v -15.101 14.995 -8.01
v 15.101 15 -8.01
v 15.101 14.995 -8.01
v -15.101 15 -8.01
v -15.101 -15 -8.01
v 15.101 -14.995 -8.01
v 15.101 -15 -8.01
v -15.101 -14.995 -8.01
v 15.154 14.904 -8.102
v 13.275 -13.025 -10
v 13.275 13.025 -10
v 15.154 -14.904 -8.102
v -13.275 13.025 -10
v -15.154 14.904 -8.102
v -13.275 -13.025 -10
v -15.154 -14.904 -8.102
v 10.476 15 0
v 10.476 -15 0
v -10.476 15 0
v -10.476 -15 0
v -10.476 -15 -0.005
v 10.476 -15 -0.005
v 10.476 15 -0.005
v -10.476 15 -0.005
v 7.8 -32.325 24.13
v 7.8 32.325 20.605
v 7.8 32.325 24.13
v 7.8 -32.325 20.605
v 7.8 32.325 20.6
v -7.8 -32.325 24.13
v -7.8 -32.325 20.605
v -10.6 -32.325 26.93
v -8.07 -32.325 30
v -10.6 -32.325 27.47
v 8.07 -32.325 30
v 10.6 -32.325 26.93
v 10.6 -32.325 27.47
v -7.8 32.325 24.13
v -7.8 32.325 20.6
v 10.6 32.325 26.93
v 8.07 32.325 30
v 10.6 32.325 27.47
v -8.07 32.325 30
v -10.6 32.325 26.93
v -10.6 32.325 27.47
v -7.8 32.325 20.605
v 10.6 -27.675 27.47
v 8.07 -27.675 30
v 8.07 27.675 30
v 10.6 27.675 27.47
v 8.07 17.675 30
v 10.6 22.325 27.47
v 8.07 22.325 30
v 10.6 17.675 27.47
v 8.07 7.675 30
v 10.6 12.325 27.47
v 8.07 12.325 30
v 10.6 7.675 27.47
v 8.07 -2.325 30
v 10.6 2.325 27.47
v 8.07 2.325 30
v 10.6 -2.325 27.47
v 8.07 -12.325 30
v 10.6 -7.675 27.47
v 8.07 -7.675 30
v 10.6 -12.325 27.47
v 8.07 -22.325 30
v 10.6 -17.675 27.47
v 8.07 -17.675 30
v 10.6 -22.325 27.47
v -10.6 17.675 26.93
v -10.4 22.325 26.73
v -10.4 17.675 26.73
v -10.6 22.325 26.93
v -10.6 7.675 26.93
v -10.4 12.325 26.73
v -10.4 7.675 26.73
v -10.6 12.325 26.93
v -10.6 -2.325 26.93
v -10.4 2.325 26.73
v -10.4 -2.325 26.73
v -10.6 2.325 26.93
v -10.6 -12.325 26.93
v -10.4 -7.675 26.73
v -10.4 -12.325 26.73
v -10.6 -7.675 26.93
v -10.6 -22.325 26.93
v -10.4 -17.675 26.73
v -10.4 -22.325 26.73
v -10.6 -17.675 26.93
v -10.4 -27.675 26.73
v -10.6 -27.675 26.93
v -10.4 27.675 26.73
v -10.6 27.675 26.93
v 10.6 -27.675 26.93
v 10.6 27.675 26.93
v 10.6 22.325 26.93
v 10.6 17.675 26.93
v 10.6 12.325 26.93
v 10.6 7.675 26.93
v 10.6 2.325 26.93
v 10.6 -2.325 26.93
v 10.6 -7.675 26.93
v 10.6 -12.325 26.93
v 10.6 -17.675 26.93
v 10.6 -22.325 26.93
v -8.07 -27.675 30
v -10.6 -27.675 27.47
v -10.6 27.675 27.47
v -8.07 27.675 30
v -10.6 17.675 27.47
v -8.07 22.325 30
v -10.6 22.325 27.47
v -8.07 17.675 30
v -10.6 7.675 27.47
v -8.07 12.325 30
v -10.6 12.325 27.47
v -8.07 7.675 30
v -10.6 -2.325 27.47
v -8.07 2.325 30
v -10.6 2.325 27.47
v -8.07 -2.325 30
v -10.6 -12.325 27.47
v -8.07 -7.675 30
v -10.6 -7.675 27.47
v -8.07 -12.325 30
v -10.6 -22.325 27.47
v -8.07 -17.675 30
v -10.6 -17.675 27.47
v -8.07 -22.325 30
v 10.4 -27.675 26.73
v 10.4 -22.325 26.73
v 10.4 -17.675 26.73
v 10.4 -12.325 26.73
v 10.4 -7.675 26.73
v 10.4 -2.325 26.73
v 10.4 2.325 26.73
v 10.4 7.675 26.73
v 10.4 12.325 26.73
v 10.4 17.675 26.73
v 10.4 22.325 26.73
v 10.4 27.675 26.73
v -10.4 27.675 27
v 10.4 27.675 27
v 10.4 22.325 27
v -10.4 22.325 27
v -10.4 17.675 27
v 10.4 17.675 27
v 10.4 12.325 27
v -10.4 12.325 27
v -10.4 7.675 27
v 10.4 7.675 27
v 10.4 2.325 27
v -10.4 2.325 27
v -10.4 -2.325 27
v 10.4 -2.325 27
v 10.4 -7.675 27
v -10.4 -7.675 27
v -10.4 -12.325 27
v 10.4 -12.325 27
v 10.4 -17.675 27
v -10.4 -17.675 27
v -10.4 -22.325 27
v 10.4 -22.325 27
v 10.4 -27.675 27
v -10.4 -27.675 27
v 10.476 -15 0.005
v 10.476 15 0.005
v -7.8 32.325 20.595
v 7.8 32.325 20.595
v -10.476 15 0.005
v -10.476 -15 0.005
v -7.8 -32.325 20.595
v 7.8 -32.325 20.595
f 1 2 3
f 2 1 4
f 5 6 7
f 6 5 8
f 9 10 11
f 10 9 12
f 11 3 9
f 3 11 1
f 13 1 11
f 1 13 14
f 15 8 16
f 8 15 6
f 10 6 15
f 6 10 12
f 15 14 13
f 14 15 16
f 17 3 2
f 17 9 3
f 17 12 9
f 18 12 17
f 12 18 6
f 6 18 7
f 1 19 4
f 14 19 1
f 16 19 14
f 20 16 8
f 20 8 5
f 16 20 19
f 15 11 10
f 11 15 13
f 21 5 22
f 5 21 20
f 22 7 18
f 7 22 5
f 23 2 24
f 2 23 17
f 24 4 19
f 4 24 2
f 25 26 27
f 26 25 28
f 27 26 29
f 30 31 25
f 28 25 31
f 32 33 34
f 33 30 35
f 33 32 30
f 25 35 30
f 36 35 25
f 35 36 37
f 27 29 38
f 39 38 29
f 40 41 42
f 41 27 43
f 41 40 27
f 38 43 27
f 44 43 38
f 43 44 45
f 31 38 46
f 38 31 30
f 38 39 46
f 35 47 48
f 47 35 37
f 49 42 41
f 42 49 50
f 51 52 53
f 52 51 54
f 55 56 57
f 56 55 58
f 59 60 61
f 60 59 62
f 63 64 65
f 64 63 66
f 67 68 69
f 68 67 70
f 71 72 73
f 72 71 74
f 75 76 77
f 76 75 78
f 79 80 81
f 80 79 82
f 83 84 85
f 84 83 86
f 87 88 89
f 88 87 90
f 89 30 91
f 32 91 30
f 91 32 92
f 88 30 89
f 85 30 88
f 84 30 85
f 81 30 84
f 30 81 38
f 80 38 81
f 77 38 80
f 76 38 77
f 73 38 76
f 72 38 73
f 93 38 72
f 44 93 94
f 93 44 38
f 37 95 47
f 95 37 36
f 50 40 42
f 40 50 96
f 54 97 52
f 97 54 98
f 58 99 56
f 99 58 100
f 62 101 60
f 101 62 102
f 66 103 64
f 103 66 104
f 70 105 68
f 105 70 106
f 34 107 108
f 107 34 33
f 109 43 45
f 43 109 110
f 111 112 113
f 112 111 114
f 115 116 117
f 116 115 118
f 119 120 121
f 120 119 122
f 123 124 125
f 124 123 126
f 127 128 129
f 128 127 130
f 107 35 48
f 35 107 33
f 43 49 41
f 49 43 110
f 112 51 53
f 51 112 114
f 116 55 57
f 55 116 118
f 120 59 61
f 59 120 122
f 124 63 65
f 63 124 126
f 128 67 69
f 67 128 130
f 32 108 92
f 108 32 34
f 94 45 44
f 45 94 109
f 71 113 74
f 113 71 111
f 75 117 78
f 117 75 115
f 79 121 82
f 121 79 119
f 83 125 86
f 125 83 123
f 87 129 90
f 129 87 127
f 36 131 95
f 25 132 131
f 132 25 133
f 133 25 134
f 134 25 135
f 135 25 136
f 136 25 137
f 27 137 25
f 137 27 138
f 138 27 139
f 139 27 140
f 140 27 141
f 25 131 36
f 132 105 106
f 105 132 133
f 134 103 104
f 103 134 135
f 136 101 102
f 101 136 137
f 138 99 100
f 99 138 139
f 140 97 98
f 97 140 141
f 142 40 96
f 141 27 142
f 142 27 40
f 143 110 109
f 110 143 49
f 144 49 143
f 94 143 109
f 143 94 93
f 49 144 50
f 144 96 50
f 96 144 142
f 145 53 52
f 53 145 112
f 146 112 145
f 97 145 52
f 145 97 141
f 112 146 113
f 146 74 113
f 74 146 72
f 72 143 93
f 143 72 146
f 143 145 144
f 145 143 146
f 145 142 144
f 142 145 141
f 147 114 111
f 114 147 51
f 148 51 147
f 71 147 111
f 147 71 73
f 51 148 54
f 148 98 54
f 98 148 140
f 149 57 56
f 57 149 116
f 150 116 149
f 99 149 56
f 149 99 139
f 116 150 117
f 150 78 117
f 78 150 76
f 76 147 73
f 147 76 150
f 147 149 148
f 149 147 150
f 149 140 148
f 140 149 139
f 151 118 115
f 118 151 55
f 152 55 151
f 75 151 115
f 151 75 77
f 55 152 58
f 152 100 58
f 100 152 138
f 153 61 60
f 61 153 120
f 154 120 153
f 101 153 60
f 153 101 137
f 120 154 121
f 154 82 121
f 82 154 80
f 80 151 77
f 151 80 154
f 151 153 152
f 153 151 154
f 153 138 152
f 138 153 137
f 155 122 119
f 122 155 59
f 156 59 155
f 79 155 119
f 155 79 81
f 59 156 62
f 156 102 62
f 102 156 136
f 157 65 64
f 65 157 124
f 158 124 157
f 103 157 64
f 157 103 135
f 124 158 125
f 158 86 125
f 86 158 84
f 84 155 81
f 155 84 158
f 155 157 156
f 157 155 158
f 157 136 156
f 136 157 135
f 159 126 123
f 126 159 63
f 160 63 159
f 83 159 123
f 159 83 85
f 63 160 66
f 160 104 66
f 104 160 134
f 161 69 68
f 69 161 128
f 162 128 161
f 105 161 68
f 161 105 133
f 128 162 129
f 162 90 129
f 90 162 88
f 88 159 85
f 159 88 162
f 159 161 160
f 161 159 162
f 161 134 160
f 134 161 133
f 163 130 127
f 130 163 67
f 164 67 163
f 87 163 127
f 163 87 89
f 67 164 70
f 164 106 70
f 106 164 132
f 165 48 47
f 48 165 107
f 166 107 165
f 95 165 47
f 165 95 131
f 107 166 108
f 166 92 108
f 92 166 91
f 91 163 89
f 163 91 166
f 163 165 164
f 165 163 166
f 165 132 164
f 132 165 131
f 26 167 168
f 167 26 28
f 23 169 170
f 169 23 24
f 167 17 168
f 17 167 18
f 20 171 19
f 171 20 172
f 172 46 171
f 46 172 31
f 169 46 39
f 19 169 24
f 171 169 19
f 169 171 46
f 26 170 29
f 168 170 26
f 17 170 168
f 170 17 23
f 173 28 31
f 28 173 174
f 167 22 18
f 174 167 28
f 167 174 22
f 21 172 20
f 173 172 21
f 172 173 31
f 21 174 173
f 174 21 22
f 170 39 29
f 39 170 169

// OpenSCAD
// Parametric NATO Rail for Astro Dovetail by Bikecyclist
// https://www.thingiverse.com/thing:3004127
// V1: First release

//CUSTOMIZER VARIABLES

/* [Parameters] */

// (must be >= dovetail height + 9.4)
total_height = 40;

l_dovetail = 30;

//Typical Astro Dovetail: 32.5 mm
w_dovetail = 32.5;

//Typical Astro Dovetail: 10 mm
h_dovetail = 10;

//Typical Astro Dovetail: 60 degrees
angle_dovetail = 60;

//Height of 45 degree chamfer at bottom of dovetail
h_chamfer = 2;

//Rail length is determined by number of slots (total length is 4.65 mm + 10 mm per slot)
n_slots = 6;

//CUSTOMIZER VARIABLES END

/* [Constants] */

// Constant to ensure proper meshing, should normally not be changed
epsilon = 0.01;         

// Constant, should normally not be changed
w_railbase = 15.6;

union ()
{
    dovetail (l_dovetail, w_dovetail, h_dovetail, angle_dovetail);

    hull ()
    {
        cube ([w_dovetail - 2 * h_dovetail / tan (angle_dovetail), l_dovetail, epsilon], center = true);
        
        translate ([0, 0, total_height - 9.4 - h_dovetail])
            cube ([w_railbase, 10 * (n_slots + 1) - 5.35, epsilon], center = true);
    }

    translate ([0, 0, total_height - 9.4 - h_dovetail])
        nato_rail (n_slots);    
}

module dovetail (l, w, h, a = 60)
{
    rotate ([90, 0, 0])
        difference ()
        {
            translate ([0, -h, -l/2])
                linear_extrude (l)
                    polygon 
                        ([
                            [-w/2, 0],
                            [-w/2 + h / tan (a), h],
                            [w/2 - h / tan (a), h],
                            [w/2, 0],
                        ]);
            
            translate ([0, -h + h_chamfer/2 - epsilon, 0])
                difference ()
                {
                    cube ([w + 2 * epsilon, h_chamfer, l + 2 * epsilon], center = true);

                    hull ()
                    {
                        translate ([0, -h_chamfer/2 - epsilon, 0])
                            cube ([w - 2 * h_chamfer - 2* h_chamfer * cos (angle_dovetail), epsilon, l - 2 * h_chamfer], center = true);
                        
                        translate ([0, h_chamfer/2 + epsilon, 0])
                            cube ([w - 2 * h_chamfer * cos (angle_dovetail), epsilon, l], center = true);
                    }
                }
        }
}

module nato_rail (n = 5)
{
    ws = 5.35;

    h0 = 5;
    h1 = 3.53;
    h2 = 5.87;
    h3 = 3;

    w0 = 20;
    w1 = 15.6;
    
    l = 10 * (n + 1) - ws;
    
    rotate ([90, 0, 0])
        translate ([0, -h0, -l/2])
            rail(h0, h1, l, w0, w1);
    
    
    module rail(h0, h1, l, w0, w1)
    {
        difference ()
        {
            union ()
            {
                railbase(h0, h1, l, w0, w1);                
                translate ([0, h0 + h1, 0])
                railprism (l);
            };
            union ()
            {
                for (i = [1:1:n]) {
                    translate ([0, h0 + h1, 10 * i - ws])
                    railslot(ws);
                }
            };
        };
    };


    module railbase (h0, h1, l, w0, w1)
    {
        translate ([0, h0 + h1 / 2, l/2])
        cube ([w1, h1, l], center = true);
    }
    
    module basefillet (h0, l, w1)
    {
    difference() {
            translate ([w1 / 2, h0, 0])
            cube ([1.5, 1.5, l]);
            translate ([w1 / 2 + 1.5, h0 + 1.5, l / 2])
            cylinder (l+1, 1.5, 1.5, $fn=64, center = true);
        }
    }
    
    module railprism (l)
    {
        linear_extrude (height = l, convexity = 10)
        polygon (points = [[7.8, 0], [10.6, 2.8], [10.6, 3.34], [8.07, 5.87], [-8.07, 5.87], [-10.6, 3.34], [-10.6, 2.8], [-7.8, 0]], convexity = 10);
    }
    
    module railslot (l)
    {
        linear_extrude (height = l, convexity = 10)
        polygon (points = [[11, 6], [11, 2.65], [10.4, 2.6], [10.4, 2.87], [-10.4, 2.87], [-10.4, 2.6], [-11, 2.65], [-11, 6]], convexity = 10);
    }
    
}
